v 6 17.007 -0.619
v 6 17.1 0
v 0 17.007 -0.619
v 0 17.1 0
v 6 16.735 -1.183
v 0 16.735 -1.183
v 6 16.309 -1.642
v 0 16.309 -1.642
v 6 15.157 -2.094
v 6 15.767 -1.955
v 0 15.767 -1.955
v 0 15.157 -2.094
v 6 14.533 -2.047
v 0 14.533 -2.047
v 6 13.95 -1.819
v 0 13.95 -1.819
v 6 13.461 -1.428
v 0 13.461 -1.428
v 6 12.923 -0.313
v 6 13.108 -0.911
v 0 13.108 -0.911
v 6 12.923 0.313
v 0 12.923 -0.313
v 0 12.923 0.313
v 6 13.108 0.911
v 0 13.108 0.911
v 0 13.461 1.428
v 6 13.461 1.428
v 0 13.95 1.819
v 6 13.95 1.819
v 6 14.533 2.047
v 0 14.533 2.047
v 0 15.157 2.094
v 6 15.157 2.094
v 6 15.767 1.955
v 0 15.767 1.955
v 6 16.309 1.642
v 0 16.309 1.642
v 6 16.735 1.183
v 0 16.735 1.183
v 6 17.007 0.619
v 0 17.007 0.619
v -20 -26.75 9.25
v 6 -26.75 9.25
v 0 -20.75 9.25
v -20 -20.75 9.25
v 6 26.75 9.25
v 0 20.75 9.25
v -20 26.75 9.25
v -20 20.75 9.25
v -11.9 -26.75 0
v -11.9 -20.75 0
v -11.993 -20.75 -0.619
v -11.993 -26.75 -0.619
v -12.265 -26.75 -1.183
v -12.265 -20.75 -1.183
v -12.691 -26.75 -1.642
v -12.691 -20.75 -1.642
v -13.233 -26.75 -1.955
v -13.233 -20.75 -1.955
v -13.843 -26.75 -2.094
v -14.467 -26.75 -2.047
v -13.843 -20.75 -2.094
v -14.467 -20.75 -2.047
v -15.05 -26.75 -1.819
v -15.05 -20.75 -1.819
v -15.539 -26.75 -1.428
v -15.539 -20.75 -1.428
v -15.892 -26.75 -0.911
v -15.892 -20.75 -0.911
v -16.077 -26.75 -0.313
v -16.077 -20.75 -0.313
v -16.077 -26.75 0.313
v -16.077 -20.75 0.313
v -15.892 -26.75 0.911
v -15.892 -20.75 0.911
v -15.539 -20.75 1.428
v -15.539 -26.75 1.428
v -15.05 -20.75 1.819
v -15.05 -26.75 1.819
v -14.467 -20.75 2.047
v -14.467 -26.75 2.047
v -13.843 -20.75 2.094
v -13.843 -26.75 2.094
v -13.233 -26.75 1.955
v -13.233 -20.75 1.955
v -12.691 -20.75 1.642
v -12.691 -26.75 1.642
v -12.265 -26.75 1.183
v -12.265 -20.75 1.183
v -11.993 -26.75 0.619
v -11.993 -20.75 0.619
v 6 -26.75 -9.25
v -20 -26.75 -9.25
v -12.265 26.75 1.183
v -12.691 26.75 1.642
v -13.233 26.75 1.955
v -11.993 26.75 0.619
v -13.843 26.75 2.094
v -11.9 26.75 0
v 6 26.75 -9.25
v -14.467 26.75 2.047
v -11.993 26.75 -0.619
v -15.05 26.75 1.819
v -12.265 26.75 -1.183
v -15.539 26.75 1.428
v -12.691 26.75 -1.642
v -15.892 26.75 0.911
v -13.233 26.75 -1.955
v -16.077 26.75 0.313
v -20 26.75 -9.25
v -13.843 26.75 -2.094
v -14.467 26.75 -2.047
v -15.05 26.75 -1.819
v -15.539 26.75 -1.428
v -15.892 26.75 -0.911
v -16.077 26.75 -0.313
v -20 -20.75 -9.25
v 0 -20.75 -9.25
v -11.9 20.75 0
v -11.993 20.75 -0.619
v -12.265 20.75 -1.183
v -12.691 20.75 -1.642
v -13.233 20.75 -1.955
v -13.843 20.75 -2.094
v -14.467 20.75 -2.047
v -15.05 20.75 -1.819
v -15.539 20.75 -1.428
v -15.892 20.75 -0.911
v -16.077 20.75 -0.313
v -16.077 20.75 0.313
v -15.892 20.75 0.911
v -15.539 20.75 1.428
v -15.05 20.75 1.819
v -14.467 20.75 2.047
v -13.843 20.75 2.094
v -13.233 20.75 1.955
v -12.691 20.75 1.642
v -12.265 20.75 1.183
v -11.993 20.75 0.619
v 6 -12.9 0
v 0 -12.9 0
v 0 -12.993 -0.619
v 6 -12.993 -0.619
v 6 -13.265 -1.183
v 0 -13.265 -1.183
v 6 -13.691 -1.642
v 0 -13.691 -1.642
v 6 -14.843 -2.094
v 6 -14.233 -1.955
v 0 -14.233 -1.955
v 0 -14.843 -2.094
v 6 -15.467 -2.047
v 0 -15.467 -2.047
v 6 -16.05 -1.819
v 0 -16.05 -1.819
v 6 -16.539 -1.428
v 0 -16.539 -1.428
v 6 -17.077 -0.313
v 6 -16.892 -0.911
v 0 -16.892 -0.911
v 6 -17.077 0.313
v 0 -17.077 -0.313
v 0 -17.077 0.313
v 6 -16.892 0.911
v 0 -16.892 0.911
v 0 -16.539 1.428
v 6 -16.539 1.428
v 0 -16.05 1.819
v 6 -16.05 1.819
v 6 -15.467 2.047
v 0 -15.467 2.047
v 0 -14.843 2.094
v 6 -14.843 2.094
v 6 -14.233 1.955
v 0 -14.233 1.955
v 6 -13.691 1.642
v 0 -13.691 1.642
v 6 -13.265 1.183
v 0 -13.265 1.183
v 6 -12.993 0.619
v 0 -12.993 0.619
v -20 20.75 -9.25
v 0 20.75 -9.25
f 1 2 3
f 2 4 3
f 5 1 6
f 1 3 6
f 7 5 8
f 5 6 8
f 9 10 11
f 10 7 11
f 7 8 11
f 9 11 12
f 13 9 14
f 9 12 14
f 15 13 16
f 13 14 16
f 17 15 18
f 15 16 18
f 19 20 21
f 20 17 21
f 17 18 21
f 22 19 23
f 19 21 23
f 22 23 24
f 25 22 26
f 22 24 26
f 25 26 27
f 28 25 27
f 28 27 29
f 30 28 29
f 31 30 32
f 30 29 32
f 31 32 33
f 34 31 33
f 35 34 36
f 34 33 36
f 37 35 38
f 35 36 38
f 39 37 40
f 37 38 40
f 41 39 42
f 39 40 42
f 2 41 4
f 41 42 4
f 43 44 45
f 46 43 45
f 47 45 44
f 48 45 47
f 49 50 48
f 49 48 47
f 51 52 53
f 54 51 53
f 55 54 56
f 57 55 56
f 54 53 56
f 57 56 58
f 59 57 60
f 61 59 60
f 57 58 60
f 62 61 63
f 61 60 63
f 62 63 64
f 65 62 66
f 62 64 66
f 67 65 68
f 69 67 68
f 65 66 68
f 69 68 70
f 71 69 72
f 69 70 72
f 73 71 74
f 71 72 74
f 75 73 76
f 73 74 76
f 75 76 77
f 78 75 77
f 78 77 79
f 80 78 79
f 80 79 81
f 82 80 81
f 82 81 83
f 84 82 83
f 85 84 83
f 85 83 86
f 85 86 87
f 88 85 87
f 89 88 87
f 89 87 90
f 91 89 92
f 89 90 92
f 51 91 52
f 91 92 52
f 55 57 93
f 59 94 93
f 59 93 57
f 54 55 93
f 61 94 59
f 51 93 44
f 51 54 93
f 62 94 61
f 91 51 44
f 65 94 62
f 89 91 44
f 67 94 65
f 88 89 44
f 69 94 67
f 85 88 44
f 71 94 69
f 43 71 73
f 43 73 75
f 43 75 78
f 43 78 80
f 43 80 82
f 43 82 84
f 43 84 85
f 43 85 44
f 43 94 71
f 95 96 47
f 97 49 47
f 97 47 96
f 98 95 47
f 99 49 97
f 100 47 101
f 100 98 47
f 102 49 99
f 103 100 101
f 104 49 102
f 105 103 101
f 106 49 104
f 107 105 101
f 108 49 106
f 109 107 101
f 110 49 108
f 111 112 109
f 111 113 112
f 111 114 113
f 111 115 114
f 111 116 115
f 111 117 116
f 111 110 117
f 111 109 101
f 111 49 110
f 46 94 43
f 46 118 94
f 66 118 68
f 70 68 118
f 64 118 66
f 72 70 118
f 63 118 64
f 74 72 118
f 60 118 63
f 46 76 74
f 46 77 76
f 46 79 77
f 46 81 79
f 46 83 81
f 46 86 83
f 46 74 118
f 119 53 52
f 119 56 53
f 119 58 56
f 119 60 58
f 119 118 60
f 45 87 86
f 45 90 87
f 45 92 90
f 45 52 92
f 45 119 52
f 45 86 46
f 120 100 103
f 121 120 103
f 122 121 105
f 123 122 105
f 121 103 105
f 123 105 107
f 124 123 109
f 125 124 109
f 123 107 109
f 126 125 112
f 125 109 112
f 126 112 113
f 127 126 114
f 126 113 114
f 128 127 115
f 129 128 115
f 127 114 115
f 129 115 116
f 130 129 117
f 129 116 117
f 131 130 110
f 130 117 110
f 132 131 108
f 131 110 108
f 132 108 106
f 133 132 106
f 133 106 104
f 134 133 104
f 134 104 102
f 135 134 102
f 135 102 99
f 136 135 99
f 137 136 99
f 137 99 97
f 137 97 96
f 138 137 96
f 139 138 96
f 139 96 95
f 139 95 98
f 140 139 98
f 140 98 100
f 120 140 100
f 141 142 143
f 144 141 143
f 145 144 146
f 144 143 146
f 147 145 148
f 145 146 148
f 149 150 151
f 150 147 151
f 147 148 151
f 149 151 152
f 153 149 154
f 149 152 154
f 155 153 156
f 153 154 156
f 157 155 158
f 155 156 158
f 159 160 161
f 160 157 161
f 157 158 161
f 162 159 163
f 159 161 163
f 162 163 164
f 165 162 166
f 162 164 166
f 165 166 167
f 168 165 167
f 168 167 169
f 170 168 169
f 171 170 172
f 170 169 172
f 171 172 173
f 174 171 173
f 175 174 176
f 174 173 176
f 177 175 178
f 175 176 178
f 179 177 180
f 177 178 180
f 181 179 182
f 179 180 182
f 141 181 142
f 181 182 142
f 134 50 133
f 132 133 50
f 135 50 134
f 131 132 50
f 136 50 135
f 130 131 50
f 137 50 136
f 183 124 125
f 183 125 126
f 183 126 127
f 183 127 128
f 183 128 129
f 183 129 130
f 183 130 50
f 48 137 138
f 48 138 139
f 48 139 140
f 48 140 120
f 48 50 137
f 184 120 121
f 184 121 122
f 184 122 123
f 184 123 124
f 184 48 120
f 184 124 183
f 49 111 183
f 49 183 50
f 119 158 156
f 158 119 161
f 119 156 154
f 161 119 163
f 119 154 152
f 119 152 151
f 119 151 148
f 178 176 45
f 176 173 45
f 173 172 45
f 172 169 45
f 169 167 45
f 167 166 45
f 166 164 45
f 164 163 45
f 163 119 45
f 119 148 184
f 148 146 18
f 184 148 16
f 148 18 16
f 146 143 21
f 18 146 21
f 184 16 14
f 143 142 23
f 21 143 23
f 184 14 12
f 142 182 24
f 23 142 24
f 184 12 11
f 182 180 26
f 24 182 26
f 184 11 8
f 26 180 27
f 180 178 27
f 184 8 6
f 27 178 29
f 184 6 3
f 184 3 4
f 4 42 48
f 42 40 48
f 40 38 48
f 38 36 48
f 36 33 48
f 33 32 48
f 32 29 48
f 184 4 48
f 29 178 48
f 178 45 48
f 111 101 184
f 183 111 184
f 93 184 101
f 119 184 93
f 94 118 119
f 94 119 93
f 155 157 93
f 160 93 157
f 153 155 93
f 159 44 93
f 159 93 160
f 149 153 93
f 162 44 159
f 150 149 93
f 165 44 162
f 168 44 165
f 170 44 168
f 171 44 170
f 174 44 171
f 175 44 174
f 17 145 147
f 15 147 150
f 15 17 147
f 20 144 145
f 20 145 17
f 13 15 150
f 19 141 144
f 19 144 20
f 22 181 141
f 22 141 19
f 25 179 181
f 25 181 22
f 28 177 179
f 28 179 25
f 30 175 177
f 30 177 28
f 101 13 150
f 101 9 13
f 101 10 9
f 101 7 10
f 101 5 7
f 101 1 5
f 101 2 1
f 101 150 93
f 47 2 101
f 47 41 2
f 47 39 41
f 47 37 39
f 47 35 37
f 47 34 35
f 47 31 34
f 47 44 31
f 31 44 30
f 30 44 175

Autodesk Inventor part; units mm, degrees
ref_plane "YZ Plane" through (0, 0, 0) normal (1, 0, 0) x (0, 1, 0)
ref_plane "XZ Plane" through (0, 0, 0) normal (0, 1, 0) x (-1, 0, 0)
ref_plane "XY Plane" through (0, 0, 0) normal (0, 0, 1) x (1, 0, 0)
sketch "Sketch1" plane through (0, 0, 0) normal (1, 0, 0) x (0, 1, 0)
  line L0 (-26.75, 9.25) -> (26.75, 9.25)
  line L1 (26.75, 9.25) -> (26.75, -9.25)
  line L2 (26.75, -9.25) -> (-26.75, -9.25)
  line L3 (-26.75, -9.25) -> (-26.75, 9.25)
  line L4 (-26.75, 9.25) -> (26.75, -9.25) construction
  line L5 (26.75, 9.25) -> (-26.75, -9.25) construction
  circle A0 centre (15, 0) radius 2.1
  circle A1 centre (-15, 0) radius 2.1
  point P0 (0, 0)
  dimension "d0" = 53.5
  dimension "d1" = 18.5
  dimension "d2" = 4.2
  dimension "d3" = 4.2
  dimension "d4" = 30
  dimension "d5" = 11.75
  dimension "d6" = 9.25
  dimension "d7" = 9.25
extrude "Extrusion1" add sketch "Sketch1" along normal blind 6
sketch "Sketch2" plane through (0, 0, 0) normal (-1, 0, 0) x (0, 0, 1)
  line L0 (-9.25, 26.75) -> (9.25, 26.75) projected
  line L1 (-9.25, 26.75) -> (9.25, 26.75)
  line L2 (9.25, 26.75) -> (9.25, 20.75)
  line L3 (9.25, 20.75) -> (-9.25, 20.75)
  line L4 (-9.25, 20.75) -> (-9.25, 26.75)
  line L5 (9.25, 26.75) -> (9.25, -26.75) projected
  line L6 (9.25, -26.75) -> (-9.25, -26.75)
  line L7 (-9.25, -26.75) -> (-9.25, -20.75)
  line L8 (-9.25, -20.75) -> (9.25, -20.75)
  line L9 (9.25, -20.75) -> (9.25, -26.75)
  point P0 (0, 0)
  dimension "d10" = 18.5
  dimension "d11" = 6
  dimension "d12" = 18.5
  dimension "d13" = 6
extrude "Extrusion2" add sketch "Sketch2" along normal blind 20
sketch "Sketch3" plane through (6, 26.75, 9.25) normal (0, 1, 0) x (1, 0, 0)
  circle A0 centre (-20, 9.25) radius 2.1
  line L0 (0, 0) -> (-26, 0) projected
  line L1 (0, 18.5) -> (0, 0) projected
  point P0 (-6, 9.25)
  dimension "d16" = 4.2
  dimension "d18" = 20
  dimension "d21" = 9.25
extrude "Extrusion3" cut sketch "Sketch3" against normal blind 100
equation "\"d7\" = d6"
properties part number "End Bracing" material "Aluminum 6061"
